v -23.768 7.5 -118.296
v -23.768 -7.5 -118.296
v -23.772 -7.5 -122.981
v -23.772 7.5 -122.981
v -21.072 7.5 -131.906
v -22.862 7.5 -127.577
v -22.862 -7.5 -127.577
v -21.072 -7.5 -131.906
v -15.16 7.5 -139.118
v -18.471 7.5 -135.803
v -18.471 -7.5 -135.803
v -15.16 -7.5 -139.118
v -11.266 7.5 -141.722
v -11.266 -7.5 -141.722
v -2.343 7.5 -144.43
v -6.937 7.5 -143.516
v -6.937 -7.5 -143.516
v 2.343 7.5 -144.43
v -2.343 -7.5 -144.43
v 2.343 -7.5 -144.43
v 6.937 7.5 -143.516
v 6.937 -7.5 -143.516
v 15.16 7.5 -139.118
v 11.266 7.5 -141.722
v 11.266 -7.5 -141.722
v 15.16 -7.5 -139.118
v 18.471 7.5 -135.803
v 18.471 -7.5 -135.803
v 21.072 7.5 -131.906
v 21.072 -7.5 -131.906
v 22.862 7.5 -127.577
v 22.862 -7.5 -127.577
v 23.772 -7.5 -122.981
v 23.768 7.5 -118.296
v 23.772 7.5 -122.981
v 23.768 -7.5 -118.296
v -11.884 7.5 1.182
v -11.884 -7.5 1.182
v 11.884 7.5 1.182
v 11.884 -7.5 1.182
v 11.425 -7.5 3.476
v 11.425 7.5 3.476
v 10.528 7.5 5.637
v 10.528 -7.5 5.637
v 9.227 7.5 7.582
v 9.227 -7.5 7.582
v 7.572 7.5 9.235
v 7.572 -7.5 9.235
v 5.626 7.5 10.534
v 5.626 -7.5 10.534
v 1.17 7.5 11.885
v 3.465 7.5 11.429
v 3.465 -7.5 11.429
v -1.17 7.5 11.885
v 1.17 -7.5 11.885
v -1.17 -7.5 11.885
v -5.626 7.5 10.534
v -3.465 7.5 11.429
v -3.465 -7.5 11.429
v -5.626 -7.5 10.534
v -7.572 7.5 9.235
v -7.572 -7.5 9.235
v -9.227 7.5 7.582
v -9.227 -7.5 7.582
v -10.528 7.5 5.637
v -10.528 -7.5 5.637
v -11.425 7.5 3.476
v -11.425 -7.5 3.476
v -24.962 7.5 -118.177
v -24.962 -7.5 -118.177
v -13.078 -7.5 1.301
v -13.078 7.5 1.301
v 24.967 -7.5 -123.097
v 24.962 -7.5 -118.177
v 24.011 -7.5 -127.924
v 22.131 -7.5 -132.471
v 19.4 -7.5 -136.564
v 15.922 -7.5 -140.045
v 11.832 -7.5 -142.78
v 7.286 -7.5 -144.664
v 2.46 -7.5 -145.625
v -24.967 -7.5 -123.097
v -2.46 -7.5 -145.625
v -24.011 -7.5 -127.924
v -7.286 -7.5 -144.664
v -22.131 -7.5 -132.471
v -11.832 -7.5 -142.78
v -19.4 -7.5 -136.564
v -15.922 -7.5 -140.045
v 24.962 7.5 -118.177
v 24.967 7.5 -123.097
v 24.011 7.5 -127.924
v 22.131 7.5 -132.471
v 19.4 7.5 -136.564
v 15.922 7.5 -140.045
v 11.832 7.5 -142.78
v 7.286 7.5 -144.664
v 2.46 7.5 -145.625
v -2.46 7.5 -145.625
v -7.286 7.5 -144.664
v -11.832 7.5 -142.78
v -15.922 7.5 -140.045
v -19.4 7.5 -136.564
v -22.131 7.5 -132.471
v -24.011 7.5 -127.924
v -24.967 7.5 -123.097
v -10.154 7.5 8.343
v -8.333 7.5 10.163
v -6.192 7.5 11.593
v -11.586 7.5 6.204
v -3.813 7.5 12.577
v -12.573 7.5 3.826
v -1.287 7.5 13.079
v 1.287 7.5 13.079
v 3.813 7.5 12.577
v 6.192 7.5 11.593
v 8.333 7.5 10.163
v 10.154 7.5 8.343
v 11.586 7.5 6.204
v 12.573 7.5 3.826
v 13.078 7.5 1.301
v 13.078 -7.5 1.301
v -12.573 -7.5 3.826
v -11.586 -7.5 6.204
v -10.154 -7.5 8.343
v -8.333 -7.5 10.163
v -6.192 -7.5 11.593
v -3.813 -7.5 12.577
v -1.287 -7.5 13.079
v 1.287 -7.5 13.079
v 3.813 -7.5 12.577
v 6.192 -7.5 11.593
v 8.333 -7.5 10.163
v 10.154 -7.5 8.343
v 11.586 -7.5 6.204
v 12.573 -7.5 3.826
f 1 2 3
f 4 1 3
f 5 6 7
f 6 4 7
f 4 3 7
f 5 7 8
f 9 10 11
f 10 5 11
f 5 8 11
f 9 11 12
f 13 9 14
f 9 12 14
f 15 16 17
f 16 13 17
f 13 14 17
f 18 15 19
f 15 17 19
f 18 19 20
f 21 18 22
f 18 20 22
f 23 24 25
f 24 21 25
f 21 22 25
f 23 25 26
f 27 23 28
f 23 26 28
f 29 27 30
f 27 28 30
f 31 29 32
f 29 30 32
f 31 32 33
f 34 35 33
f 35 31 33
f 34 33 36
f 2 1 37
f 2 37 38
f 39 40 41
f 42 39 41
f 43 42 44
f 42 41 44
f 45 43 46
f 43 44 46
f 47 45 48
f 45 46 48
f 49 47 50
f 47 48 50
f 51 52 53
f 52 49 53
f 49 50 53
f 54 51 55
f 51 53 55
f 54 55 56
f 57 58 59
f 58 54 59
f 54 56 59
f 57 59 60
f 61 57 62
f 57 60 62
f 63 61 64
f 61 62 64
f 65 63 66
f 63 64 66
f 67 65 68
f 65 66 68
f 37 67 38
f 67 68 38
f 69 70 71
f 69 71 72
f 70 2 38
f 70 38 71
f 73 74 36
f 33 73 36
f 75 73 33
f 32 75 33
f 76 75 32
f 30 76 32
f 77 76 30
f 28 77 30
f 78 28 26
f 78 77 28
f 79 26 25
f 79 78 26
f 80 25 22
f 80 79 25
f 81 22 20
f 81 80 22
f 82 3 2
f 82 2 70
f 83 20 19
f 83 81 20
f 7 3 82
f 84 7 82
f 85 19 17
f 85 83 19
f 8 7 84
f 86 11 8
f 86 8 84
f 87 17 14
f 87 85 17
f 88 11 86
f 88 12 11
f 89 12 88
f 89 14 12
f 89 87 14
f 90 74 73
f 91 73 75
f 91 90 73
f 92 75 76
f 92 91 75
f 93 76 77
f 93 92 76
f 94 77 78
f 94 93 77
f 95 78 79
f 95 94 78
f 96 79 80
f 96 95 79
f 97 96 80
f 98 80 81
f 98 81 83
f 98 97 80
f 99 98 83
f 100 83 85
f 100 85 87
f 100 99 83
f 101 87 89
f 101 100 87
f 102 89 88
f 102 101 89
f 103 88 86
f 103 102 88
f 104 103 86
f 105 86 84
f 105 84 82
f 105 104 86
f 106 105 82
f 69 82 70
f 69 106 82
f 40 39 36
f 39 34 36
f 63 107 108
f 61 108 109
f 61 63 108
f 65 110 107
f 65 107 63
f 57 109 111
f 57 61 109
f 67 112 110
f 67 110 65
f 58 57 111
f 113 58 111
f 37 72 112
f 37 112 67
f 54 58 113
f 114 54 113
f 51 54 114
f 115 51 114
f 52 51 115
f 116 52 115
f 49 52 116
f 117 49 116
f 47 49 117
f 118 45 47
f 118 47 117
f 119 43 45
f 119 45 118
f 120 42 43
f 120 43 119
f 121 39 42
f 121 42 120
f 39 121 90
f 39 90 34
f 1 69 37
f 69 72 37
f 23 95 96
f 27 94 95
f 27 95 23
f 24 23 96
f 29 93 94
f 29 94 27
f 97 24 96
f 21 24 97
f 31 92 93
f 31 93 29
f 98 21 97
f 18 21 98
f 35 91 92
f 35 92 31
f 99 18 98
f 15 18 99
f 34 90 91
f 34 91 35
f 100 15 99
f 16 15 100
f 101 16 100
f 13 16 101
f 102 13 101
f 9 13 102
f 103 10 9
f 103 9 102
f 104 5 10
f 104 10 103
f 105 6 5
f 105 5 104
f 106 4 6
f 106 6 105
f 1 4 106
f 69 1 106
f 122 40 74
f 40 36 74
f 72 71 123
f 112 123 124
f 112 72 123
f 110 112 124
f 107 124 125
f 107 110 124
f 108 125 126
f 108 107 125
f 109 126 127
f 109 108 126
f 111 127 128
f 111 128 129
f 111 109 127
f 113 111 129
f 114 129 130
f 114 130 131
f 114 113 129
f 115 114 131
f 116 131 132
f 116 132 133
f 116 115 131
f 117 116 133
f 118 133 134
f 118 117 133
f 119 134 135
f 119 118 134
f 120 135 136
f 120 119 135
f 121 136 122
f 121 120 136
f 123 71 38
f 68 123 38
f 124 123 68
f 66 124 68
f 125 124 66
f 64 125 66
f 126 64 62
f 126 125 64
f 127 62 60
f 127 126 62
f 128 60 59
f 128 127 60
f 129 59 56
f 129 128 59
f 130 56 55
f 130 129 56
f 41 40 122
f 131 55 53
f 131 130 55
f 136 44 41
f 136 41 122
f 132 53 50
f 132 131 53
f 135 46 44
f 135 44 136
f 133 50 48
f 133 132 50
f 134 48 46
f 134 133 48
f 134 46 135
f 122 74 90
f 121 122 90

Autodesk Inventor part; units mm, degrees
ref_plane "YZ Plane" through (0, 0, 0) normal (1, 0, 0) x (0, 1, 0)
ref_plane "XZ Plane" through (0, 0, 0) normal (0, 1, 0) x (-1, 0, 0)
sketch "Sketch1" plane through (0, 0, 0) normal (0, 1, 0) x (-1, 0, 0)
  arc A0 (11.8839, 1.1821) -> (-11.8839, 1.1821) centre (0, 0) ccw
  arc A1 (-23.7682, -118.2958) -> (23.7682, -118.2958) centre (0, -120.66) ccw
  line L0 (11.8839, 1.1821) -> (23.7682, -118.2958)
  line L1 (-11.8839, 1.1821) -> (-23.7682, -118.2958)
  dimension "d0" = 23.885
  dimension "d1" = 47.771
  dimension "d2" = 120.66
ref_plane "Work Plane1" through (-11.8839, 0, 1.1821) normal (-0.0989806, 0, -0.9950894) x (0, -1, 0)
sketch "Sketch2" plane through (-11.8839, 0, 1.1821) normal (-0.0989806, 0, -0.9950894) x (0, -1, 0)
  line L0 (-7.5, 1.2) -> (7.5, 1.2)
  line L1 (7.5, 1.2) -> (7.5, 0)
  line L2 (7.5, 0) -> (-7.5, 0)
  line L3 (-7.5, 0) -> (-7.5, 1.2)
  line L4 (-7.5, 1.2) -> (7.5, 0) construction
  line L5 (7.5, 1.2) -> (-7.5, 0) construction
  point P0 (0, -11.9425)
  point P1 (0, 0.6)
  point P2 (0, 0)
  point P3 (0, 0)
  dimension "d3" = 1.2
  dimension "d4" = 15
sweep "Sweep1" add profiles "Sketch2" path "Sketch1"
properties part number "2309HCMUTE-CDT23-BELT_S5M-355X71X15" material "Rubber"
